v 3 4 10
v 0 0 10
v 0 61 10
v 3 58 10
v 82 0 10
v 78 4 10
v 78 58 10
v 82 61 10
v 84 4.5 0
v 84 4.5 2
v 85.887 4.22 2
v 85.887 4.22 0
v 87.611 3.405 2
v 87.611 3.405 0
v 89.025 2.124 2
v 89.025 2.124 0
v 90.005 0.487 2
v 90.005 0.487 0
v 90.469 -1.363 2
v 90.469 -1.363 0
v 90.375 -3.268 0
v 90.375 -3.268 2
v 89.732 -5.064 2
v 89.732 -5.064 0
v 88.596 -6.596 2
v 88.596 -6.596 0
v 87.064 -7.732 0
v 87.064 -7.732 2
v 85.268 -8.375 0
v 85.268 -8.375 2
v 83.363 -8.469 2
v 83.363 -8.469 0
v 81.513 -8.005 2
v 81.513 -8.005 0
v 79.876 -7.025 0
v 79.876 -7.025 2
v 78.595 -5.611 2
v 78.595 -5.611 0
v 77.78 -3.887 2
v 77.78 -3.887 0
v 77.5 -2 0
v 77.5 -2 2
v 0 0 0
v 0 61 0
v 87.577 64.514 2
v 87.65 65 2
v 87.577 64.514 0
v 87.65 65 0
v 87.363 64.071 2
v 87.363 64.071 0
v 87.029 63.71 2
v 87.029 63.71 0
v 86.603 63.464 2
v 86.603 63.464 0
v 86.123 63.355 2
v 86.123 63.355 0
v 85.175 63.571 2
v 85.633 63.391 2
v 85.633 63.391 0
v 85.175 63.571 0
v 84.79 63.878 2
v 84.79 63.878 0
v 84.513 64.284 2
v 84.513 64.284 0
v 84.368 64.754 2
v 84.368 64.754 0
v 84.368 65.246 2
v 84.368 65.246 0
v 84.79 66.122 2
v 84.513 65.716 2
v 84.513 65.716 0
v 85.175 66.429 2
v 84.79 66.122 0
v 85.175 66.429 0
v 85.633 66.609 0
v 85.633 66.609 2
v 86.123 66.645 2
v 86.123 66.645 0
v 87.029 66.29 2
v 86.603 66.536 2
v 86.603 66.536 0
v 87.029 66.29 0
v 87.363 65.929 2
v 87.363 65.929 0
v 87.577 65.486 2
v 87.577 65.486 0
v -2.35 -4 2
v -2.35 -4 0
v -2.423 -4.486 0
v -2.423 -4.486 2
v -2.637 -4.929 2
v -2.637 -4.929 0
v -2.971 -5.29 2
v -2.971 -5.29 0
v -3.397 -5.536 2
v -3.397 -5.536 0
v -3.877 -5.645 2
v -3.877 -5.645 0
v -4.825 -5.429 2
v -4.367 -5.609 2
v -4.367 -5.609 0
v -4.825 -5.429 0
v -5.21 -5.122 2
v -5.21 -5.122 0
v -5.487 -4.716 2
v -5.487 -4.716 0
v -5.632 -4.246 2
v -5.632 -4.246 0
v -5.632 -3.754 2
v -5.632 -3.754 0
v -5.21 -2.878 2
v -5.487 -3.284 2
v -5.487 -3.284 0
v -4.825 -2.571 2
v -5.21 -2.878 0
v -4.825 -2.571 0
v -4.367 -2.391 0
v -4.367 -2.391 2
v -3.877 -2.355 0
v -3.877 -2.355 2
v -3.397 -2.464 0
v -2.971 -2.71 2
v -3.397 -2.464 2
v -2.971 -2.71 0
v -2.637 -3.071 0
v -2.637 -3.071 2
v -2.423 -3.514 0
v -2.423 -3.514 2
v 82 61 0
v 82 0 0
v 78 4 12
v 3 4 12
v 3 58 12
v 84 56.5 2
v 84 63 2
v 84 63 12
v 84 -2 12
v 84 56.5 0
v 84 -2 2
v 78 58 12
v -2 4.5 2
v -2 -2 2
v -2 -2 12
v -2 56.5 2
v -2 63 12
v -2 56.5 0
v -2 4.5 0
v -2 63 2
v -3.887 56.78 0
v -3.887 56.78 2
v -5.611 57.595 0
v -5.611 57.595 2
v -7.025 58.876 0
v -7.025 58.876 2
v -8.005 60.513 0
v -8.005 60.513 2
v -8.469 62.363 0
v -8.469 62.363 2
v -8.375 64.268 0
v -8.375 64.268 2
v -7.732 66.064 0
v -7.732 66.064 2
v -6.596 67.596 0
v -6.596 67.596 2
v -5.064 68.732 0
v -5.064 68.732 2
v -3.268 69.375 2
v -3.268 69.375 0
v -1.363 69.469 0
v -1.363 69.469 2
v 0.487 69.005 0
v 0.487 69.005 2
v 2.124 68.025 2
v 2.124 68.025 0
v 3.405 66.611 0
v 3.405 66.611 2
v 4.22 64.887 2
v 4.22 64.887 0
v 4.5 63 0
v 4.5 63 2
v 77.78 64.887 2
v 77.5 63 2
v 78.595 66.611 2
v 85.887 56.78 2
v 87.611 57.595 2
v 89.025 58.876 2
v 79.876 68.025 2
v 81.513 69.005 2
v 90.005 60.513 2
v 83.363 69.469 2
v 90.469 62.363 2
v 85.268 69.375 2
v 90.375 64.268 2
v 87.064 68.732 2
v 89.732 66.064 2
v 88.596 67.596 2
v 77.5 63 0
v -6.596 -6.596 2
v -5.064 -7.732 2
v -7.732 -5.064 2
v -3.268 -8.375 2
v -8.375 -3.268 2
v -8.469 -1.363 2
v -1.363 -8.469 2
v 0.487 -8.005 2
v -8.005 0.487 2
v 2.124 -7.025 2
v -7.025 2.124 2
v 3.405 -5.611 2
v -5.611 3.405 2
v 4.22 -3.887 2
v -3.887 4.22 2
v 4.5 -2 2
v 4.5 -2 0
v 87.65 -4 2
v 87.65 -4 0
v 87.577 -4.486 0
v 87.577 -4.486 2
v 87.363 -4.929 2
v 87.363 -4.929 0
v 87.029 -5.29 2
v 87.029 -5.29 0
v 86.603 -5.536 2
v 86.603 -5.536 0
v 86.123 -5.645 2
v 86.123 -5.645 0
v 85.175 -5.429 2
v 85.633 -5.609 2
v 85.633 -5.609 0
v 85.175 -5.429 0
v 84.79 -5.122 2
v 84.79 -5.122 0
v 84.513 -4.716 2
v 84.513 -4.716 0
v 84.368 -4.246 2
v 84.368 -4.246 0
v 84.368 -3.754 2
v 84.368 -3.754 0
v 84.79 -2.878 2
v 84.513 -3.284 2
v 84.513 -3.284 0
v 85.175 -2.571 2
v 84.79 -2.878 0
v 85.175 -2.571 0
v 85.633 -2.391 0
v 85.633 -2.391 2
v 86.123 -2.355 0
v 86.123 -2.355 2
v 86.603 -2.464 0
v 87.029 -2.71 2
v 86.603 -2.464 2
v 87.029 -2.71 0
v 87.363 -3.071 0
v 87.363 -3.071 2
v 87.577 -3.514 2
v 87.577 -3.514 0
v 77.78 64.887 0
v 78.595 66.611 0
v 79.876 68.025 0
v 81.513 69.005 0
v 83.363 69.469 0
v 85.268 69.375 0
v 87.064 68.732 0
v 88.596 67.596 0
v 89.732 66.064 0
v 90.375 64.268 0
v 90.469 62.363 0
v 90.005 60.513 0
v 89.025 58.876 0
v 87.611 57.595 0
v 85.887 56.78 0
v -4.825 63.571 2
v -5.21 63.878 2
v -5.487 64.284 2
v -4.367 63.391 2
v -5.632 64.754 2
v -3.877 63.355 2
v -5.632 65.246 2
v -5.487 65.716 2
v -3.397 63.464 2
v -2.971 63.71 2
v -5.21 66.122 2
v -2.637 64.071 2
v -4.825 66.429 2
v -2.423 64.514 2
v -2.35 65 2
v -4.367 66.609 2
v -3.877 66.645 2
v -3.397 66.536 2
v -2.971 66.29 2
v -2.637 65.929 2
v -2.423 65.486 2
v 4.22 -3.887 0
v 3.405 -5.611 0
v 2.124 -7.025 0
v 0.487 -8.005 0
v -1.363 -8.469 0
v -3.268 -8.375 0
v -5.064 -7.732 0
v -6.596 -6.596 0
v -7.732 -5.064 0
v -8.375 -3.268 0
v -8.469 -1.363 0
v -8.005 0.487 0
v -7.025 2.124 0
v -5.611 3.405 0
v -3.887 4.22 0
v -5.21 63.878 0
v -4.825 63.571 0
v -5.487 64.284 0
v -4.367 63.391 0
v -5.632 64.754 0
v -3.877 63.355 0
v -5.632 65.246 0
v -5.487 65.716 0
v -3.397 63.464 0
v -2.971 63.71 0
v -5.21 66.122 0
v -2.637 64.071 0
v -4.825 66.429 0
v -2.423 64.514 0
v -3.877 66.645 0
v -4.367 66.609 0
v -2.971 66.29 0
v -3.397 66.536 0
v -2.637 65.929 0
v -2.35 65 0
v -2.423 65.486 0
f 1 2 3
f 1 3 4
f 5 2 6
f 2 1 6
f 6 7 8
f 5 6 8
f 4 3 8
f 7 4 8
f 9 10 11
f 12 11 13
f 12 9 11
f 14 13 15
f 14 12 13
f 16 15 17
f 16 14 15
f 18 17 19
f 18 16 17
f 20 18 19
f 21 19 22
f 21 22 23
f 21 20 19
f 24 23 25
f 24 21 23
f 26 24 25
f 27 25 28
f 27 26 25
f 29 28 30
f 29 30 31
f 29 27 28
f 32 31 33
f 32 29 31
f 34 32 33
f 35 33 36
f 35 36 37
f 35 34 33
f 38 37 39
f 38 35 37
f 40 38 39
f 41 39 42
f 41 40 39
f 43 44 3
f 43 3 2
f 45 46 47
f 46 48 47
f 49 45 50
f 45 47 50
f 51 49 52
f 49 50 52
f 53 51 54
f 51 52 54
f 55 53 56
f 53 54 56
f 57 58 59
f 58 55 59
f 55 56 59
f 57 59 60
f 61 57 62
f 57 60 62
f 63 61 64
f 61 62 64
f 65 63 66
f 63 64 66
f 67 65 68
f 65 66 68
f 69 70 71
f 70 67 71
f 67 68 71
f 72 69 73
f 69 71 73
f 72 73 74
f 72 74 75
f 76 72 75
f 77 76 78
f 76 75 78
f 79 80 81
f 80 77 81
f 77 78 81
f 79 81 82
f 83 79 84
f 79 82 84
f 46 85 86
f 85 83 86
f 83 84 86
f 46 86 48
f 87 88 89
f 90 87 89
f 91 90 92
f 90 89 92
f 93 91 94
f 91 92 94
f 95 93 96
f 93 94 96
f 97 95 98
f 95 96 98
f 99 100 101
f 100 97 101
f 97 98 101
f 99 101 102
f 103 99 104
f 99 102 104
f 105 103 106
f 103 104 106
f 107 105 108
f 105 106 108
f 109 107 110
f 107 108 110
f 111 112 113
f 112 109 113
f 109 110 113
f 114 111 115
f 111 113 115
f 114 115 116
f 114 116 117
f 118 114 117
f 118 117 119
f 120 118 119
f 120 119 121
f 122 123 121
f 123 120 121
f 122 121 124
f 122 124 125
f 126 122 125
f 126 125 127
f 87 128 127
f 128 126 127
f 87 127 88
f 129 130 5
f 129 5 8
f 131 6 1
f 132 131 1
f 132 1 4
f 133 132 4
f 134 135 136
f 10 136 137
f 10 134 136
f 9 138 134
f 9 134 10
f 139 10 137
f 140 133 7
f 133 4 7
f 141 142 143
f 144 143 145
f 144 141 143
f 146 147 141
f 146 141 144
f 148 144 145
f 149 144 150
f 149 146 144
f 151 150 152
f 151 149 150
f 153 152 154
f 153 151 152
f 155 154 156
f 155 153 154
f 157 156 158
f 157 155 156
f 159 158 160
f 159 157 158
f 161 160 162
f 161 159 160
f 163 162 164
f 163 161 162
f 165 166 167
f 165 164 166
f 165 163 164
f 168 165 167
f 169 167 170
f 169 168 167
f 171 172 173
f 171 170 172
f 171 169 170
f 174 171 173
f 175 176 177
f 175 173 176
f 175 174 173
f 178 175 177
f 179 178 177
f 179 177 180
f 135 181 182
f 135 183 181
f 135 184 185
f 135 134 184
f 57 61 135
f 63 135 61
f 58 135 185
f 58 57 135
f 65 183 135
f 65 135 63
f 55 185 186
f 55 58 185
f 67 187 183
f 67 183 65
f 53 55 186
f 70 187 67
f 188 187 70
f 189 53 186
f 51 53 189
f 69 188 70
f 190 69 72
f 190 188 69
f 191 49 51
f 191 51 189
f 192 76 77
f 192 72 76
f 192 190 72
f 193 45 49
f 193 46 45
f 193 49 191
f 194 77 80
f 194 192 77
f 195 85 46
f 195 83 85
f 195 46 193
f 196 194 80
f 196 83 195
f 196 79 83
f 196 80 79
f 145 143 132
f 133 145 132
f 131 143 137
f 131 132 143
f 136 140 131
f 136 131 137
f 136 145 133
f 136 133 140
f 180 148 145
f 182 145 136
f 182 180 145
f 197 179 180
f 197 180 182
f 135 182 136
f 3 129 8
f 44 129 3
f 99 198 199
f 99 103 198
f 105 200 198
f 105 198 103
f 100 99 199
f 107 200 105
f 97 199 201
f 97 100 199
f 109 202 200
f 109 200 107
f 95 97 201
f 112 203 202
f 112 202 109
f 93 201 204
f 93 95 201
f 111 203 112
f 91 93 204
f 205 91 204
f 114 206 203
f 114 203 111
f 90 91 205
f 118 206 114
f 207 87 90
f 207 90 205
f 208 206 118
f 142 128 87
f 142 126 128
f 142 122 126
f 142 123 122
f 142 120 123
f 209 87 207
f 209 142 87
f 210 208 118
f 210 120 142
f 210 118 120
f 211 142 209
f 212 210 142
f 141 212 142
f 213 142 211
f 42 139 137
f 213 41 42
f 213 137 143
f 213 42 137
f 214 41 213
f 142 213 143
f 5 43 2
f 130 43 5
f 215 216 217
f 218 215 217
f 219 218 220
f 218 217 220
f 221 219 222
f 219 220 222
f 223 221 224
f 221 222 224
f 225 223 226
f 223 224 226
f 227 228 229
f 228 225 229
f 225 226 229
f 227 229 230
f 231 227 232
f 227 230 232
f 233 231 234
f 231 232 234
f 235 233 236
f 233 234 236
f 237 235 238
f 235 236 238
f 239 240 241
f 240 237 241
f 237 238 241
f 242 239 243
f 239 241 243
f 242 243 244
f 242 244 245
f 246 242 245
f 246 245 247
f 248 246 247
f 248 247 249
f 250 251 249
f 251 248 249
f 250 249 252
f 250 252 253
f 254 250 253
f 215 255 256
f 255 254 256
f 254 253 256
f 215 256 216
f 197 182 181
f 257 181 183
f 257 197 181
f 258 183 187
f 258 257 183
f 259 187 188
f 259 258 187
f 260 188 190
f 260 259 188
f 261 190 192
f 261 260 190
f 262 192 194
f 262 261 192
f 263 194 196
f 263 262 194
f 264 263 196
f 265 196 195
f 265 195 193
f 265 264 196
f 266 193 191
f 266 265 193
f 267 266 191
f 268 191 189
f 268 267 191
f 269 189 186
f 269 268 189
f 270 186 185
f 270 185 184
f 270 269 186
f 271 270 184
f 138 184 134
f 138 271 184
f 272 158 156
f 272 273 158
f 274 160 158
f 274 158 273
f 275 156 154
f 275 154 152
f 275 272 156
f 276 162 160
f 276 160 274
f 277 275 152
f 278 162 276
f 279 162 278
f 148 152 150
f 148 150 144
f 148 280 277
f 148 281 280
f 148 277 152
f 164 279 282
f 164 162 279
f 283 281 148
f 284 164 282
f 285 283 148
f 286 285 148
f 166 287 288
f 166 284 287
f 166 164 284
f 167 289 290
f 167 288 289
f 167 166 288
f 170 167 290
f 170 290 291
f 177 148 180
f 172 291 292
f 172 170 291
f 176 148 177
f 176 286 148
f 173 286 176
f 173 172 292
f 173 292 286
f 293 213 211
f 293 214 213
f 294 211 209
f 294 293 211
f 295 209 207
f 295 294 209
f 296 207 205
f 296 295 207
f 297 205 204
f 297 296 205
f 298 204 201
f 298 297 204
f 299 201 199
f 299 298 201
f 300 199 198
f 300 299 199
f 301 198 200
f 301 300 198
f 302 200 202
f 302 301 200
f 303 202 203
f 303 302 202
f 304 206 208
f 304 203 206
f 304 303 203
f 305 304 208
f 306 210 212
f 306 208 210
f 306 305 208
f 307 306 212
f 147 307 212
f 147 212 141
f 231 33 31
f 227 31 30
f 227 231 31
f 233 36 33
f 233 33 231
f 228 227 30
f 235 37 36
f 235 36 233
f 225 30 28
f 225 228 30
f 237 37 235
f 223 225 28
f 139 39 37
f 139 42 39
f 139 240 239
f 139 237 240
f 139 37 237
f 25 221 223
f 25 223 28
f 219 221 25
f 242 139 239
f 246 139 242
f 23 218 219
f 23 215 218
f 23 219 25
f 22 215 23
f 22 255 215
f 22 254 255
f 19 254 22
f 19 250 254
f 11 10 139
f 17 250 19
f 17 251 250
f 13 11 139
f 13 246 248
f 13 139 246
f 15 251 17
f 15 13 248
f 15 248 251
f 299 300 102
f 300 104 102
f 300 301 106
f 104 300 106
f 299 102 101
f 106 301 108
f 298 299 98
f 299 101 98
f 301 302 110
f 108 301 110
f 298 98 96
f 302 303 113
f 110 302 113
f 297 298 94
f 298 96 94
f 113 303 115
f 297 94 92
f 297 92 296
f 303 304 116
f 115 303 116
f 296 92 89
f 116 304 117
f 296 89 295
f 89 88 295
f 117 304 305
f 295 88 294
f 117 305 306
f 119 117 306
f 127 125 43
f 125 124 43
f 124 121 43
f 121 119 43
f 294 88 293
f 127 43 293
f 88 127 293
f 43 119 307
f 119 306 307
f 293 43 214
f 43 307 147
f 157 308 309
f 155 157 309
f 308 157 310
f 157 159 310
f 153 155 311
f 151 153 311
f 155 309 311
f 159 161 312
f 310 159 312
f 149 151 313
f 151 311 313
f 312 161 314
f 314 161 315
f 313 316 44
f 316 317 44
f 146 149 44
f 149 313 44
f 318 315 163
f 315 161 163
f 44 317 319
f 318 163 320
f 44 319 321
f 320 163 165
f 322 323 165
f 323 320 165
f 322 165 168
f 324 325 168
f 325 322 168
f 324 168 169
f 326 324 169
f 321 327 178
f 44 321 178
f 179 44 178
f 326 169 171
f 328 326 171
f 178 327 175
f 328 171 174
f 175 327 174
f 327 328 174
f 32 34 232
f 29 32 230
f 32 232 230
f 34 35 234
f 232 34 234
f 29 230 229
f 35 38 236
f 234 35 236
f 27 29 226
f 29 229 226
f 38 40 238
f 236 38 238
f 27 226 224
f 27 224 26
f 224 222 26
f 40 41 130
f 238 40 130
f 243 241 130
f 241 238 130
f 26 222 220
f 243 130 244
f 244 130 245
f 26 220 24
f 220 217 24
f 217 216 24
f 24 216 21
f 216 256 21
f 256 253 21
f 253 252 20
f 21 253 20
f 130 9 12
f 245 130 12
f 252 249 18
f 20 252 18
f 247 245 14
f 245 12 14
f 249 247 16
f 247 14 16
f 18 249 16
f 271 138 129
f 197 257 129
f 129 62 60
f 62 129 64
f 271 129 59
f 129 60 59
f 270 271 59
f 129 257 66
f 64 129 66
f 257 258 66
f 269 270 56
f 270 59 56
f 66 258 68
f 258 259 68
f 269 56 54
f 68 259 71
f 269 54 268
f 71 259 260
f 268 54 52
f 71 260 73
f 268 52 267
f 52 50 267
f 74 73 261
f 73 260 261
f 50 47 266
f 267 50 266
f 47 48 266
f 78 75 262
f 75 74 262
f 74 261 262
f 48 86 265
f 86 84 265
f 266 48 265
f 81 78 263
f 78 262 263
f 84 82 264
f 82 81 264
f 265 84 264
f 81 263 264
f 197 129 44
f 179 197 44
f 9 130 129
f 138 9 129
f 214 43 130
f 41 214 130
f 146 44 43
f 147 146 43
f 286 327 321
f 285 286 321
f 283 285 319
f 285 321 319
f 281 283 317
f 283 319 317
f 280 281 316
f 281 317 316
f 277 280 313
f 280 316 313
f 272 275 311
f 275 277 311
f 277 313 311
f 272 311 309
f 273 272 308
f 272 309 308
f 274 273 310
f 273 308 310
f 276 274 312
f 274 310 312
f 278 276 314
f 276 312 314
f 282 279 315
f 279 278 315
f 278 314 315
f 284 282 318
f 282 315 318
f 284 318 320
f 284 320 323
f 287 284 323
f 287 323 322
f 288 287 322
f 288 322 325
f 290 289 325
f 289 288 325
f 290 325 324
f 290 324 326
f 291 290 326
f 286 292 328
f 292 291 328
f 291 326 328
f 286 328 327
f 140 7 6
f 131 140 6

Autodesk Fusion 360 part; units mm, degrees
sketch "Sketch1" plane through (0, 0, 0) normal (0, 0, 1) x (1, 0, 0)
  line L0 (0, 0) -> (82, 0)
  line L1 (82, 0) -> (82, 61)
  line L2 (82, 61) -> (0, 61)
  line L3 (0, 61) -> (0, 0)
  line L4 (-2, 63) -> (84, 63)
  line L5 (84, 63) -> (84, -2)
  line L6 (84, -2) -> (-2, -2)
  line L7 (-2, -2) -> (-2, 63)
  circle A0 centre (-2, -2) radius 6.5
  circle A1 centre (-2, 63) radius 6.5
  circle A2 centre (84, 63) radius 6.5
  circle A3 centre (84, -2) radius 6.5
  circle A4 centre (-4, -4) radius 1.65
  circle A5 centre (-4, 65) radius 1.65
  circle A6 centre (86, 65) radius 1.65
  circle A7 centre (86, -4) radius 1.65
  line L8 (3, 58) -> (78, 58)
  line L9 (78, 58) -> (78, 4)
  line L10 (78, 4) -> (3, 4)
  line L11 (3, 4) -> (3, 58)
  dimension "d1" = 61
  dimension "d2" = 82
  dimension "d3" = 2
  dimension "d4" = 2
  dimension "d5" = 2
  dimension "d6" = 2
  dimension "d7" = 13
  dimension "d8" = 13
  dimension "d9" = 13
  dimension "d10" = 13
  dimension "d11" = 3.3
  dimension "d12" = 2
  dimension "d13" = 2
  dimension "d14" = 3.3
  dimension "d15" = 2
  dimension "d16" = 2
  dimension "d17" = 3.3
  dimension "d18" = 2
  dimension "d19" = 2
  dimension "d20" = 3.3
  dimension "d21" = 2
  dimension "d22" = 2
  dimension "d23" = 3
  dimension "d24" = 4
  dimension "d25" = 3
  dimension "d26" = 4
extrude "Extrude1" add sketch "Sketch1" along normal blind 2 contours L6 L7 A0 | L5 L6 A3 | L4 L7 A1 | L4 L5 A2 makes body 1 at (85.5519, 61.1596, 2) makes body 2 at (85.5519, -0.1596, 0) makes body 3 at (-3.5519, 61.1596, 0) makes body 4 at (-3.5519, -0.1596, 0)
extrude "Extrude2" add sketch "Sketch1" along normal blind 10 contours L0 L3 L6 L7 A0 | L0 L6 A0 A3 | L3 L7 A0 A1 | L0 L1 L5 L6 A3 | L2 L3 L4 L7 A1 | L1 L5 A2 A3 | L2 L4 A1 A2 | L1 L2 L4 L5 A2 bodies 1 2 3 4
extrude "Extrude3" add sketch "Sketch1" along normal blind 2 from surface at 10 contours L0 L3 A0 | L0 L3 L6 L7 A0 | L0 L1 L2 L3 A0 A1 A2 A3 | L0 L6 A0 A3 | L3 L7 A0 A1 | L0 L1 A3 | L0 L1 L5 L6 A3 | L2 L3 L4 L7 A1 | L2 L3 A1 | L1 L5 A2 A3 | L2 L4 A1 A2 | L1 L2 A2 | L1 L2 L4 L5 A2 bodies 1
